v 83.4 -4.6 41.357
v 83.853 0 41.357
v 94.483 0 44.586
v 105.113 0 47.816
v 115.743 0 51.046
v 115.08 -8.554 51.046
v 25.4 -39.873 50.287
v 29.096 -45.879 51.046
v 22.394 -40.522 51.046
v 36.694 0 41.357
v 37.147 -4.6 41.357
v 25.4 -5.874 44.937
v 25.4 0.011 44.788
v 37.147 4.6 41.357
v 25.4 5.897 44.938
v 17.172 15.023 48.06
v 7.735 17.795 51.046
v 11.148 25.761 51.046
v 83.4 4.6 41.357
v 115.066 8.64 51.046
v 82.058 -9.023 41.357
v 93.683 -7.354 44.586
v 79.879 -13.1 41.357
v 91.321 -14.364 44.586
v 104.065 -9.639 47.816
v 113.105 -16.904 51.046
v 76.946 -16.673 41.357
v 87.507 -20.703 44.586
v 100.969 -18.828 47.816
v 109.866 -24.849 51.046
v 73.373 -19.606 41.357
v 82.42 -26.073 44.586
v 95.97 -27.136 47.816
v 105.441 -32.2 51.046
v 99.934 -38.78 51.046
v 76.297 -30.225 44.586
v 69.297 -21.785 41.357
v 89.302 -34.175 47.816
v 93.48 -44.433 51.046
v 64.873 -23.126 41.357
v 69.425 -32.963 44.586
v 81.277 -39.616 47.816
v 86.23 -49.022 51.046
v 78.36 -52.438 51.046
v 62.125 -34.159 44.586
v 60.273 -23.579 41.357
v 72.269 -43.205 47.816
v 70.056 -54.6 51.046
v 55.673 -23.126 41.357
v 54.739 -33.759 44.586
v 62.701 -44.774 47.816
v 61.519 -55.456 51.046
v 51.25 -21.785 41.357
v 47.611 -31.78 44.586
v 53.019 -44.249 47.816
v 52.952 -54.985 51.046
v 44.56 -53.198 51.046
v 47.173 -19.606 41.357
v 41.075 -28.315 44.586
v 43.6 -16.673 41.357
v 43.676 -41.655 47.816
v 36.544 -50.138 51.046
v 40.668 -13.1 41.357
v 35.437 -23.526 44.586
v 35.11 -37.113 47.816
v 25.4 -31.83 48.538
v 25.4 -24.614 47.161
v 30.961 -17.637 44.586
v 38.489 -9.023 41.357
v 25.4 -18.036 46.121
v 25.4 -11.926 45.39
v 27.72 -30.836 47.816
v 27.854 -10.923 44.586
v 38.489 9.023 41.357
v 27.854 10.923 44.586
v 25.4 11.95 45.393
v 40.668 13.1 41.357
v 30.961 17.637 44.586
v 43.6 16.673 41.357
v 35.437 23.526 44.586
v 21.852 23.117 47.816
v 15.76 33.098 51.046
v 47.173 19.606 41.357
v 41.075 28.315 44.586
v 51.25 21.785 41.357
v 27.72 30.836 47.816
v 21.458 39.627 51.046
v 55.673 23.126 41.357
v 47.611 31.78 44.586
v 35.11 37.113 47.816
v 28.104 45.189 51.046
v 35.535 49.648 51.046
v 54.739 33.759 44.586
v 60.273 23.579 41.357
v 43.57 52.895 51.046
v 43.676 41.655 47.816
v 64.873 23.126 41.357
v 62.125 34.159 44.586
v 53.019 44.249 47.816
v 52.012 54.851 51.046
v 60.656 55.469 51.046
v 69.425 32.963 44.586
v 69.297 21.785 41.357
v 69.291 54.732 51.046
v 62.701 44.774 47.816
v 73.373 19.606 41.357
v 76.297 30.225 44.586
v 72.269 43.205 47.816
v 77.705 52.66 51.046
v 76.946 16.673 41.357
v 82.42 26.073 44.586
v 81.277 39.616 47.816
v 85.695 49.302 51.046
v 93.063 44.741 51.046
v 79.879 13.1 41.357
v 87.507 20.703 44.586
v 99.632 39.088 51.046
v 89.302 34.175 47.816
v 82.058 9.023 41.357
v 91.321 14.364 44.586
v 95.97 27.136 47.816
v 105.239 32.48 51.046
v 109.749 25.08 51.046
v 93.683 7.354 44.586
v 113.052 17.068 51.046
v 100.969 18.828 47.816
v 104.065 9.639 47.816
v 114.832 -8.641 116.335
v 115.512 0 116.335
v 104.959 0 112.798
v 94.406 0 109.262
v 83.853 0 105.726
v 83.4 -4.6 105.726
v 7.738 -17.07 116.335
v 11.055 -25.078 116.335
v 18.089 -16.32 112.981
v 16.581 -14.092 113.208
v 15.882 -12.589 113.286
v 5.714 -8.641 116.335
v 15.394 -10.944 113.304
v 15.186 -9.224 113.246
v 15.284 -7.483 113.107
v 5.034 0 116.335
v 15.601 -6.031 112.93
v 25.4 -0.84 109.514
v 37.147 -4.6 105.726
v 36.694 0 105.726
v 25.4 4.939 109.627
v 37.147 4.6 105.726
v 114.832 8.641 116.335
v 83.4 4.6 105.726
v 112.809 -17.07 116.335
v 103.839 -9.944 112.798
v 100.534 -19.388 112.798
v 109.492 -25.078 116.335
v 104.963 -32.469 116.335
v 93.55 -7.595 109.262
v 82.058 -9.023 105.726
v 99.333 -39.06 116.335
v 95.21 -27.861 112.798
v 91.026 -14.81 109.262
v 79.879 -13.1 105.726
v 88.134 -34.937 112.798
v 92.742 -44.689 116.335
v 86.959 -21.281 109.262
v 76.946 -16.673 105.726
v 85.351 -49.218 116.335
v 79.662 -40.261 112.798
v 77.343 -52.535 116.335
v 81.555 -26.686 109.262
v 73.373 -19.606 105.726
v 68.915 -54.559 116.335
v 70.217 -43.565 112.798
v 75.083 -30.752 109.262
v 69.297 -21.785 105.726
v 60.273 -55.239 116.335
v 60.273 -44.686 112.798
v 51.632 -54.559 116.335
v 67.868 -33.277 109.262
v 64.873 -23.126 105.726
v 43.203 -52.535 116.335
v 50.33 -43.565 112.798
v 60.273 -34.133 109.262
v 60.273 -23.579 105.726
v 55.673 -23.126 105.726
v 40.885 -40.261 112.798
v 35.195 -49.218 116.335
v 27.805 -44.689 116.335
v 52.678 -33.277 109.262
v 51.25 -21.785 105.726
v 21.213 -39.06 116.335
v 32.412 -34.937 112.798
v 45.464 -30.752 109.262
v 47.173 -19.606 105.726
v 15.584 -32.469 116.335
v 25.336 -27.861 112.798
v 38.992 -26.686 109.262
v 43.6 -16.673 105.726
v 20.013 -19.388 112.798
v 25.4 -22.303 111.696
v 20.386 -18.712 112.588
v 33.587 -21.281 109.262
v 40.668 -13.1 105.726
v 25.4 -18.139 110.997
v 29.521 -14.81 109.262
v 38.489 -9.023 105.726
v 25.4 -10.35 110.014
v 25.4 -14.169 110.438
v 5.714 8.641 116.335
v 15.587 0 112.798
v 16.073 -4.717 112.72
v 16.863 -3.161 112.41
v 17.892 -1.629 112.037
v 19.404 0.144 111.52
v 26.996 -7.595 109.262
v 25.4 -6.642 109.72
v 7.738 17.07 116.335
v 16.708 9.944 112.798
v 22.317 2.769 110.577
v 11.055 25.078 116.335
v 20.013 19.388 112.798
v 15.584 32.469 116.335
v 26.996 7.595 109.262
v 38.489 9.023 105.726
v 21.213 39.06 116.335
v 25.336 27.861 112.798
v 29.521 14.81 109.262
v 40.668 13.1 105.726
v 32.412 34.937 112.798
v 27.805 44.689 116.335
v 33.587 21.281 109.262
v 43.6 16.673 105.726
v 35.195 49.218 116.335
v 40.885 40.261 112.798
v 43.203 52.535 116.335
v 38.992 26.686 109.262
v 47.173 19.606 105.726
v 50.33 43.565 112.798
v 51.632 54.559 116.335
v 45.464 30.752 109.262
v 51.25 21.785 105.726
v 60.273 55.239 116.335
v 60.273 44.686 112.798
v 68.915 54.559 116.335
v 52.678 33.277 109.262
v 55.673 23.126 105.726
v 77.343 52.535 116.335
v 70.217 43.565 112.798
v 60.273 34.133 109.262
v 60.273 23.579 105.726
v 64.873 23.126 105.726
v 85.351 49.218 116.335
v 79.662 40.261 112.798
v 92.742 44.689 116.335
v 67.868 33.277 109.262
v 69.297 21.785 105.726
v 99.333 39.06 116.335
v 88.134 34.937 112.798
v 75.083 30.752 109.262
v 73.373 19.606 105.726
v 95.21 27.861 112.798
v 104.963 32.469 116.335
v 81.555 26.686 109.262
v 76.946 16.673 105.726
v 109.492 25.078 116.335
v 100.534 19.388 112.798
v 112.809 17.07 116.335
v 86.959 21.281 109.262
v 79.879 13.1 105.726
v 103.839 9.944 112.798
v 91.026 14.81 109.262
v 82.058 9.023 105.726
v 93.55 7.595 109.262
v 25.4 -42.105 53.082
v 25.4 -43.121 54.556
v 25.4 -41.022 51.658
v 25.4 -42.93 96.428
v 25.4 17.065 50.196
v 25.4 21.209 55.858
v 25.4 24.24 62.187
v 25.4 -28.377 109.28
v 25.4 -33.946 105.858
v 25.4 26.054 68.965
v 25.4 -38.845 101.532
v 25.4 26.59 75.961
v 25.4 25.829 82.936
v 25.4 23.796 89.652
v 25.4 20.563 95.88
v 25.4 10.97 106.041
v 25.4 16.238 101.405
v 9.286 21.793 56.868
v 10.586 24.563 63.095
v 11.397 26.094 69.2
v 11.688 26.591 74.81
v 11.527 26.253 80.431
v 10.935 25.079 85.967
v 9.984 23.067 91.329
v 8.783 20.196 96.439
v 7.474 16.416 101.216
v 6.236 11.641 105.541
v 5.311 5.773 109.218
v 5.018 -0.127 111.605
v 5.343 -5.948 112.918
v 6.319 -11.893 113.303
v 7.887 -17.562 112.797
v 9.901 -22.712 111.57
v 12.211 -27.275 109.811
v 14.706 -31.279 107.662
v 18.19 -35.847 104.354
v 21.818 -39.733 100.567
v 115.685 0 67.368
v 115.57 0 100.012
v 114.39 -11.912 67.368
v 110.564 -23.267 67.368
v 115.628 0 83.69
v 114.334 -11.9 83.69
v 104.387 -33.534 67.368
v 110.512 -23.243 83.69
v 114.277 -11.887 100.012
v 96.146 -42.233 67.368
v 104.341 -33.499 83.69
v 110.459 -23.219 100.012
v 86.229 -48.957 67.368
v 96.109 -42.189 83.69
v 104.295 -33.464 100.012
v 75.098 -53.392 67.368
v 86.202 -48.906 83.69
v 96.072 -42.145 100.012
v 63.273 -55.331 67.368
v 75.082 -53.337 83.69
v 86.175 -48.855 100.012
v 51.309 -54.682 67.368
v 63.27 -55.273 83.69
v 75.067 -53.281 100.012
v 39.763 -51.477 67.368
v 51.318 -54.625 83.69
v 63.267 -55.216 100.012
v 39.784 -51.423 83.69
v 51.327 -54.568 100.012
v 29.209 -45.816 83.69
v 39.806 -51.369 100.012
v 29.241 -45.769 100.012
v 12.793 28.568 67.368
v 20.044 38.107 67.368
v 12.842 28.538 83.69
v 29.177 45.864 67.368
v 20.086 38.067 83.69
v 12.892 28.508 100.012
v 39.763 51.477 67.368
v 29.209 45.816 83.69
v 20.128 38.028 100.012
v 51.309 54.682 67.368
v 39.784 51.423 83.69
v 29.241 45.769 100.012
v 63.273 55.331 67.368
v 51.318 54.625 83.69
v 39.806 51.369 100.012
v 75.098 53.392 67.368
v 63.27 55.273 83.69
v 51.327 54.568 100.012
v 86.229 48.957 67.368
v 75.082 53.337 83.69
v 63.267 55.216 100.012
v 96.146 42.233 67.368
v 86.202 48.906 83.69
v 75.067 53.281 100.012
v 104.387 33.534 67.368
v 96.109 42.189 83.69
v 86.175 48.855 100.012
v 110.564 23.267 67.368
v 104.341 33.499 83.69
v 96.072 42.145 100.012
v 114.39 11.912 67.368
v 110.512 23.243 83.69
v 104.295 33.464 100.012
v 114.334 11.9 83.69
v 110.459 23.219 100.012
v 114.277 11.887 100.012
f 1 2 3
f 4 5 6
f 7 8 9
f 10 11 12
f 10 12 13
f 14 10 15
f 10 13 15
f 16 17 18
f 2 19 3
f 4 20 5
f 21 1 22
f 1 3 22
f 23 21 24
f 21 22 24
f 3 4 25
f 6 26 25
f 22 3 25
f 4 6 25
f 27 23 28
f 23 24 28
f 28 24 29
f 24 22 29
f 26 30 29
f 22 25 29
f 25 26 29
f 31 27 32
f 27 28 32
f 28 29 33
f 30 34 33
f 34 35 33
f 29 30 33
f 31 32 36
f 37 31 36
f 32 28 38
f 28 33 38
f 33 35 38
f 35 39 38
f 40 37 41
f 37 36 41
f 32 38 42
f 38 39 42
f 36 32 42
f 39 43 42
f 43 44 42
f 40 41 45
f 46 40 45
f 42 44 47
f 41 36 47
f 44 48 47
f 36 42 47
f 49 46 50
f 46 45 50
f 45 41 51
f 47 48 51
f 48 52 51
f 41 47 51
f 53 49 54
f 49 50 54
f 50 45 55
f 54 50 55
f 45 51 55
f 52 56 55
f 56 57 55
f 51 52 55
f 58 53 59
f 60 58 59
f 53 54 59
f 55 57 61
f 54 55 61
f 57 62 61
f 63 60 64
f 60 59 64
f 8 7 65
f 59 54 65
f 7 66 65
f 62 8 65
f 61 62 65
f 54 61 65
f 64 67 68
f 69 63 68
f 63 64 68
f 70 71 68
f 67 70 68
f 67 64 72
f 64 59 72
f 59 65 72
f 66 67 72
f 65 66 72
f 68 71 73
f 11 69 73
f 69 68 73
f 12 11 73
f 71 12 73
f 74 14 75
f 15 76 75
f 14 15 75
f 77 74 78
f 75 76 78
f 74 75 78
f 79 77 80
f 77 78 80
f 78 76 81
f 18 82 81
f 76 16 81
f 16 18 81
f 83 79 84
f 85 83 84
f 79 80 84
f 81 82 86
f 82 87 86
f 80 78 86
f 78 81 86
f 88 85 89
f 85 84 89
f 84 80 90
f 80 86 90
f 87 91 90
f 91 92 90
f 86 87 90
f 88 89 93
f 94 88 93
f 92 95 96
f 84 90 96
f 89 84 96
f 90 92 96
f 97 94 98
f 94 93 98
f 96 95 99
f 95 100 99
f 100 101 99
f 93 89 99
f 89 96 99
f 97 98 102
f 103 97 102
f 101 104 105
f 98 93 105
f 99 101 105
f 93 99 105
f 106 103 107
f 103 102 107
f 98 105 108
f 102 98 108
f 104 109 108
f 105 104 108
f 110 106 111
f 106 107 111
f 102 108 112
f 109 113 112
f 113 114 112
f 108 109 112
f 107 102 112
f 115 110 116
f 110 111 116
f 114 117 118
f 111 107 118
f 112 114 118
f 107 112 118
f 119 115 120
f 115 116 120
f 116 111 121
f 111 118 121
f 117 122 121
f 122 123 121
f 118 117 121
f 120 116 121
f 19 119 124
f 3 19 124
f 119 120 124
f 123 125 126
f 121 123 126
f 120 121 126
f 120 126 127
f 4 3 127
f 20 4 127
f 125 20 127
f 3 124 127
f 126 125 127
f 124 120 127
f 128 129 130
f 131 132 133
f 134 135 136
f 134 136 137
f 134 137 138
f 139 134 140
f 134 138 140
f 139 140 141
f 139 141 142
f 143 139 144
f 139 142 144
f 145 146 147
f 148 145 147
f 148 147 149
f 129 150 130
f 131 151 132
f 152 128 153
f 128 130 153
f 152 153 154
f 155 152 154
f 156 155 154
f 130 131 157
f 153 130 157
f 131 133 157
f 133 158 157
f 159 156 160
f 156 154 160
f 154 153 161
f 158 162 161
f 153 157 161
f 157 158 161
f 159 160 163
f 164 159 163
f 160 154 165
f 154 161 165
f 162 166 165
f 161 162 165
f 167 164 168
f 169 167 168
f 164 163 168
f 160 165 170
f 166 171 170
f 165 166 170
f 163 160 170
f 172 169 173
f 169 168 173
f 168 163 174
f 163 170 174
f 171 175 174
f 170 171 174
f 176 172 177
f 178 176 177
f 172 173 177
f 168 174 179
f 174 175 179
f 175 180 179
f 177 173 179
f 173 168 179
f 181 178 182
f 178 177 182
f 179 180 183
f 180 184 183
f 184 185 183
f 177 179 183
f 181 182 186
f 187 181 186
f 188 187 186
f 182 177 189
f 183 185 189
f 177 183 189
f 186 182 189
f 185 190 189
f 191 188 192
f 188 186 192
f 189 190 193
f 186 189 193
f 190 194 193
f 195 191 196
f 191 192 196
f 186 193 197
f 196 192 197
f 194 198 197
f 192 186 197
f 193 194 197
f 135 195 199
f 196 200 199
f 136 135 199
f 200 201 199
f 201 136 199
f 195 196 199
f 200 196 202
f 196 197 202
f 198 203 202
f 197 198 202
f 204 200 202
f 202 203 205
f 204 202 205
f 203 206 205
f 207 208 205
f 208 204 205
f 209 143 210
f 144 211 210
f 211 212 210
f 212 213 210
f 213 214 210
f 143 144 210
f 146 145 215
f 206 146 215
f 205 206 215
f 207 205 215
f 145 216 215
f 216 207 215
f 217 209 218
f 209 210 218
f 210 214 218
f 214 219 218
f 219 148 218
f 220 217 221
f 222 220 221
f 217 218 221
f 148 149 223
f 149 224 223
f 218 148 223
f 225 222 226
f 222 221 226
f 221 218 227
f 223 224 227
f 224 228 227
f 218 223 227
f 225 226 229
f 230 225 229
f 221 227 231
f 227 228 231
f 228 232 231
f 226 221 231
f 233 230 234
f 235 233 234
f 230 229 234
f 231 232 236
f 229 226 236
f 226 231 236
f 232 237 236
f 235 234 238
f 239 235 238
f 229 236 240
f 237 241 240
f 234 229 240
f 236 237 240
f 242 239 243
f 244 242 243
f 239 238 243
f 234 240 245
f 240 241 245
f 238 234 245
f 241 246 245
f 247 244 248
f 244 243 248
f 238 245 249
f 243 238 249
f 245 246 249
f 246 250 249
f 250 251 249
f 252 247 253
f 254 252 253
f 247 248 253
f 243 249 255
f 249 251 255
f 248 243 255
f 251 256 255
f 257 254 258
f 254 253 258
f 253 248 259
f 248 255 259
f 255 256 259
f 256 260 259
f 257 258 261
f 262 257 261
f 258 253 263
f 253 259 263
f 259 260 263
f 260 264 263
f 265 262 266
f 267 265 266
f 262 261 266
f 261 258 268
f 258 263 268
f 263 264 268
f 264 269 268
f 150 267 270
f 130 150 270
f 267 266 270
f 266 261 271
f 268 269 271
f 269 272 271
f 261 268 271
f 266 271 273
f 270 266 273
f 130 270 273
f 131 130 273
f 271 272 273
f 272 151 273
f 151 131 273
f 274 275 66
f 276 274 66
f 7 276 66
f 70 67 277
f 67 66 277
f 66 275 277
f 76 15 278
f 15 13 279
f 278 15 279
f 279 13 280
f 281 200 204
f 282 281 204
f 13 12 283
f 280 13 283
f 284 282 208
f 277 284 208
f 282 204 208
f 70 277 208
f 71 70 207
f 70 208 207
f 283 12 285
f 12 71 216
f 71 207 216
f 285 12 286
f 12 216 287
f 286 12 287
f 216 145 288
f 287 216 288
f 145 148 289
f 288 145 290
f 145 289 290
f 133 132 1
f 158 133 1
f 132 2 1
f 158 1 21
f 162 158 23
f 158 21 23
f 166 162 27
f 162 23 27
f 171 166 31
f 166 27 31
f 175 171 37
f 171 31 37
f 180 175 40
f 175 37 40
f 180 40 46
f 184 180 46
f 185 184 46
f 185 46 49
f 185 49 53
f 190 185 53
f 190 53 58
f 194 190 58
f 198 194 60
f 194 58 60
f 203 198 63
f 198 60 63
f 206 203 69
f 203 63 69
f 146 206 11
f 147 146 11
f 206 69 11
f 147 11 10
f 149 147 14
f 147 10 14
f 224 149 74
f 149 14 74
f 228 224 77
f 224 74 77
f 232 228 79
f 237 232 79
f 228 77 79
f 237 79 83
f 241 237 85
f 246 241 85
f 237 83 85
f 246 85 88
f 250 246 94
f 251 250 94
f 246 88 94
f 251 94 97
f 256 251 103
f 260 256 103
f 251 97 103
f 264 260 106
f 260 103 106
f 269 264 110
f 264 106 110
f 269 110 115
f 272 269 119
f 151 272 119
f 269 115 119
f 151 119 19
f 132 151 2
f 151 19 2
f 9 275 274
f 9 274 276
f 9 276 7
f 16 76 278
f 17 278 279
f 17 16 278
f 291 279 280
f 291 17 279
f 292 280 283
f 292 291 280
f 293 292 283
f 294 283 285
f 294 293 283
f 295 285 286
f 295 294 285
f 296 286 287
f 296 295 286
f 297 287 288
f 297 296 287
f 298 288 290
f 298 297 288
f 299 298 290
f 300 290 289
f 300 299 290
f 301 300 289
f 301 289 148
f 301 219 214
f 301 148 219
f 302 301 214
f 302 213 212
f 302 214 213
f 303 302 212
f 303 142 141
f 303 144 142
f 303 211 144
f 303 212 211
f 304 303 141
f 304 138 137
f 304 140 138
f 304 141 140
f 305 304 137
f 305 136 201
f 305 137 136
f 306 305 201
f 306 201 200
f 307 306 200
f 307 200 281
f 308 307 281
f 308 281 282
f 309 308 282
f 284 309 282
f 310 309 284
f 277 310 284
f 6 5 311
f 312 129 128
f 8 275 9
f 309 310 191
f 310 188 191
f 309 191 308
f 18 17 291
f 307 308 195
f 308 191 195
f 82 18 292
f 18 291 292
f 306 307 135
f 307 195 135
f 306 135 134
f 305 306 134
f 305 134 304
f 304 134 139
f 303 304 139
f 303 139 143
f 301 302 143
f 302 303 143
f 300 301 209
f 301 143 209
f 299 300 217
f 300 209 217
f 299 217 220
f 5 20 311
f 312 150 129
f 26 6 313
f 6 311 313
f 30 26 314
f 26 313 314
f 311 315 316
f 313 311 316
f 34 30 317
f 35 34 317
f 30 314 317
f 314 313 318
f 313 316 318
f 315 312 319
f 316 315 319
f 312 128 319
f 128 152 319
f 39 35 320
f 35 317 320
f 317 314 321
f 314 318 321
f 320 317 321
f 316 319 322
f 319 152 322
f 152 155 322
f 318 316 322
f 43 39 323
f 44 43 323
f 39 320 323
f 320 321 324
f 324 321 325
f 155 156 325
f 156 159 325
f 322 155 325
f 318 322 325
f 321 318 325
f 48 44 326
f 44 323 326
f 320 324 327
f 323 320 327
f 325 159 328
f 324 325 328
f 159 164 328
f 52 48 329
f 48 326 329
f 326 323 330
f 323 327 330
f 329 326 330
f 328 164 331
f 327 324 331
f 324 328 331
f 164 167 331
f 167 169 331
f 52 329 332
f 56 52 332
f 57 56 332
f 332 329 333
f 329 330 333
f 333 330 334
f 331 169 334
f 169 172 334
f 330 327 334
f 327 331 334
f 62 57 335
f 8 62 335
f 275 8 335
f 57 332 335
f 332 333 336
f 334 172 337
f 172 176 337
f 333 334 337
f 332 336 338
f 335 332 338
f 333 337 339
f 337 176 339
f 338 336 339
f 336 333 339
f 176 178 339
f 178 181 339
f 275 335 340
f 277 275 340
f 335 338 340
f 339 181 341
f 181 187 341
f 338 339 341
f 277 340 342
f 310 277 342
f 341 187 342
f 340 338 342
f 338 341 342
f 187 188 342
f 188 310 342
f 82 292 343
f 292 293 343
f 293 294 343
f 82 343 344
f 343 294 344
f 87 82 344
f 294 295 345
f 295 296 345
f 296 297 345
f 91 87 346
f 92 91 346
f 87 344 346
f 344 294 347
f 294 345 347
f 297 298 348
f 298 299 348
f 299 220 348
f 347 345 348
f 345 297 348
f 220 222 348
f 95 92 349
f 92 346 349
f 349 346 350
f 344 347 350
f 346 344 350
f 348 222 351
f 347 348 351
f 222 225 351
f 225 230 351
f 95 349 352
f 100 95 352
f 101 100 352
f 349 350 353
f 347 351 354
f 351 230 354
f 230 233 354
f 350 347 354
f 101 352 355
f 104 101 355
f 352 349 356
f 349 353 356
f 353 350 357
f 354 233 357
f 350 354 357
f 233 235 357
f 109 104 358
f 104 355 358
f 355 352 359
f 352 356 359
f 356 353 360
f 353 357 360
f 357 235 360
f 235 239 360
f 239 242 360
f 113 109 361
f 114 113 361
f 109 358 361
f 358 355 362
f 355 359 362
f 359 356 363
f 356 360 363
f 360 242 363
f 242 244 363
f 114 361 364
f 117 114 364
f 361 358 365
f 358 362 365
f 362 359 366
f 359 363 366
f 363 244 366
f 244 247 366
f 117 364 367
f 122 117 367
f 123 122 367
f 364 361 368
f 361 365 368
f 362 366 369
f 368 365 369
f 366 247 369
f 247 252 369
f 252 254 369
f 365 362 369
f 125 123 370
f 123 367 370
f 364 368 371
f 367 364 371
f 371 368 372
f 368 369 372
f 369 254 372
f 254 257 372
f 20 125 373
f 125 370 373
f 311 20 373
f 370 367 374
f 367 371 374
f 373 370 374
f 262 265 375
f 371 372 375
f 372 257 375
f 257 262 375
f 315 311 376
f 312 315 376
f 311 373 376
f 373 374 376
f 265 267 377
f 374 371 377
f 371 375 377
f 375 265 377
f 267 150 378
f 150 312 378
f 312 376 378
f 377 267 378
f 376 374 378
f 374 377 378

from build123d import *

# Parameters (mm, degrees)
F2_R     = 37.958364699
F3_DEPTH = 25.399999693


with BuildPart() as f1:
    # F0 (on Front) → F1 (revolve)
    with BuildSketch(Plane.XZ):
        Polygon((115.5123189092, 116.3347512484), (83.8526785374, 105.7259817888), (83.8526785374, 41.3565523922), (115.743175149, 51.0456599295), align=None)
    revolve(axis=Axis((60.2732487023, 0, 87.5743832439), (0, 0, -1)))

    # F2 (on Right) → F3 (cut)
    with BuildSketch(Plane.YZ):
        with Locations((-11.3635012621, 75.3479318831)):
            Circle(F2_R)
    extrude(amount=F3_DEPTH, mode=Mode.SUBTRACT)


solid = f1.part
